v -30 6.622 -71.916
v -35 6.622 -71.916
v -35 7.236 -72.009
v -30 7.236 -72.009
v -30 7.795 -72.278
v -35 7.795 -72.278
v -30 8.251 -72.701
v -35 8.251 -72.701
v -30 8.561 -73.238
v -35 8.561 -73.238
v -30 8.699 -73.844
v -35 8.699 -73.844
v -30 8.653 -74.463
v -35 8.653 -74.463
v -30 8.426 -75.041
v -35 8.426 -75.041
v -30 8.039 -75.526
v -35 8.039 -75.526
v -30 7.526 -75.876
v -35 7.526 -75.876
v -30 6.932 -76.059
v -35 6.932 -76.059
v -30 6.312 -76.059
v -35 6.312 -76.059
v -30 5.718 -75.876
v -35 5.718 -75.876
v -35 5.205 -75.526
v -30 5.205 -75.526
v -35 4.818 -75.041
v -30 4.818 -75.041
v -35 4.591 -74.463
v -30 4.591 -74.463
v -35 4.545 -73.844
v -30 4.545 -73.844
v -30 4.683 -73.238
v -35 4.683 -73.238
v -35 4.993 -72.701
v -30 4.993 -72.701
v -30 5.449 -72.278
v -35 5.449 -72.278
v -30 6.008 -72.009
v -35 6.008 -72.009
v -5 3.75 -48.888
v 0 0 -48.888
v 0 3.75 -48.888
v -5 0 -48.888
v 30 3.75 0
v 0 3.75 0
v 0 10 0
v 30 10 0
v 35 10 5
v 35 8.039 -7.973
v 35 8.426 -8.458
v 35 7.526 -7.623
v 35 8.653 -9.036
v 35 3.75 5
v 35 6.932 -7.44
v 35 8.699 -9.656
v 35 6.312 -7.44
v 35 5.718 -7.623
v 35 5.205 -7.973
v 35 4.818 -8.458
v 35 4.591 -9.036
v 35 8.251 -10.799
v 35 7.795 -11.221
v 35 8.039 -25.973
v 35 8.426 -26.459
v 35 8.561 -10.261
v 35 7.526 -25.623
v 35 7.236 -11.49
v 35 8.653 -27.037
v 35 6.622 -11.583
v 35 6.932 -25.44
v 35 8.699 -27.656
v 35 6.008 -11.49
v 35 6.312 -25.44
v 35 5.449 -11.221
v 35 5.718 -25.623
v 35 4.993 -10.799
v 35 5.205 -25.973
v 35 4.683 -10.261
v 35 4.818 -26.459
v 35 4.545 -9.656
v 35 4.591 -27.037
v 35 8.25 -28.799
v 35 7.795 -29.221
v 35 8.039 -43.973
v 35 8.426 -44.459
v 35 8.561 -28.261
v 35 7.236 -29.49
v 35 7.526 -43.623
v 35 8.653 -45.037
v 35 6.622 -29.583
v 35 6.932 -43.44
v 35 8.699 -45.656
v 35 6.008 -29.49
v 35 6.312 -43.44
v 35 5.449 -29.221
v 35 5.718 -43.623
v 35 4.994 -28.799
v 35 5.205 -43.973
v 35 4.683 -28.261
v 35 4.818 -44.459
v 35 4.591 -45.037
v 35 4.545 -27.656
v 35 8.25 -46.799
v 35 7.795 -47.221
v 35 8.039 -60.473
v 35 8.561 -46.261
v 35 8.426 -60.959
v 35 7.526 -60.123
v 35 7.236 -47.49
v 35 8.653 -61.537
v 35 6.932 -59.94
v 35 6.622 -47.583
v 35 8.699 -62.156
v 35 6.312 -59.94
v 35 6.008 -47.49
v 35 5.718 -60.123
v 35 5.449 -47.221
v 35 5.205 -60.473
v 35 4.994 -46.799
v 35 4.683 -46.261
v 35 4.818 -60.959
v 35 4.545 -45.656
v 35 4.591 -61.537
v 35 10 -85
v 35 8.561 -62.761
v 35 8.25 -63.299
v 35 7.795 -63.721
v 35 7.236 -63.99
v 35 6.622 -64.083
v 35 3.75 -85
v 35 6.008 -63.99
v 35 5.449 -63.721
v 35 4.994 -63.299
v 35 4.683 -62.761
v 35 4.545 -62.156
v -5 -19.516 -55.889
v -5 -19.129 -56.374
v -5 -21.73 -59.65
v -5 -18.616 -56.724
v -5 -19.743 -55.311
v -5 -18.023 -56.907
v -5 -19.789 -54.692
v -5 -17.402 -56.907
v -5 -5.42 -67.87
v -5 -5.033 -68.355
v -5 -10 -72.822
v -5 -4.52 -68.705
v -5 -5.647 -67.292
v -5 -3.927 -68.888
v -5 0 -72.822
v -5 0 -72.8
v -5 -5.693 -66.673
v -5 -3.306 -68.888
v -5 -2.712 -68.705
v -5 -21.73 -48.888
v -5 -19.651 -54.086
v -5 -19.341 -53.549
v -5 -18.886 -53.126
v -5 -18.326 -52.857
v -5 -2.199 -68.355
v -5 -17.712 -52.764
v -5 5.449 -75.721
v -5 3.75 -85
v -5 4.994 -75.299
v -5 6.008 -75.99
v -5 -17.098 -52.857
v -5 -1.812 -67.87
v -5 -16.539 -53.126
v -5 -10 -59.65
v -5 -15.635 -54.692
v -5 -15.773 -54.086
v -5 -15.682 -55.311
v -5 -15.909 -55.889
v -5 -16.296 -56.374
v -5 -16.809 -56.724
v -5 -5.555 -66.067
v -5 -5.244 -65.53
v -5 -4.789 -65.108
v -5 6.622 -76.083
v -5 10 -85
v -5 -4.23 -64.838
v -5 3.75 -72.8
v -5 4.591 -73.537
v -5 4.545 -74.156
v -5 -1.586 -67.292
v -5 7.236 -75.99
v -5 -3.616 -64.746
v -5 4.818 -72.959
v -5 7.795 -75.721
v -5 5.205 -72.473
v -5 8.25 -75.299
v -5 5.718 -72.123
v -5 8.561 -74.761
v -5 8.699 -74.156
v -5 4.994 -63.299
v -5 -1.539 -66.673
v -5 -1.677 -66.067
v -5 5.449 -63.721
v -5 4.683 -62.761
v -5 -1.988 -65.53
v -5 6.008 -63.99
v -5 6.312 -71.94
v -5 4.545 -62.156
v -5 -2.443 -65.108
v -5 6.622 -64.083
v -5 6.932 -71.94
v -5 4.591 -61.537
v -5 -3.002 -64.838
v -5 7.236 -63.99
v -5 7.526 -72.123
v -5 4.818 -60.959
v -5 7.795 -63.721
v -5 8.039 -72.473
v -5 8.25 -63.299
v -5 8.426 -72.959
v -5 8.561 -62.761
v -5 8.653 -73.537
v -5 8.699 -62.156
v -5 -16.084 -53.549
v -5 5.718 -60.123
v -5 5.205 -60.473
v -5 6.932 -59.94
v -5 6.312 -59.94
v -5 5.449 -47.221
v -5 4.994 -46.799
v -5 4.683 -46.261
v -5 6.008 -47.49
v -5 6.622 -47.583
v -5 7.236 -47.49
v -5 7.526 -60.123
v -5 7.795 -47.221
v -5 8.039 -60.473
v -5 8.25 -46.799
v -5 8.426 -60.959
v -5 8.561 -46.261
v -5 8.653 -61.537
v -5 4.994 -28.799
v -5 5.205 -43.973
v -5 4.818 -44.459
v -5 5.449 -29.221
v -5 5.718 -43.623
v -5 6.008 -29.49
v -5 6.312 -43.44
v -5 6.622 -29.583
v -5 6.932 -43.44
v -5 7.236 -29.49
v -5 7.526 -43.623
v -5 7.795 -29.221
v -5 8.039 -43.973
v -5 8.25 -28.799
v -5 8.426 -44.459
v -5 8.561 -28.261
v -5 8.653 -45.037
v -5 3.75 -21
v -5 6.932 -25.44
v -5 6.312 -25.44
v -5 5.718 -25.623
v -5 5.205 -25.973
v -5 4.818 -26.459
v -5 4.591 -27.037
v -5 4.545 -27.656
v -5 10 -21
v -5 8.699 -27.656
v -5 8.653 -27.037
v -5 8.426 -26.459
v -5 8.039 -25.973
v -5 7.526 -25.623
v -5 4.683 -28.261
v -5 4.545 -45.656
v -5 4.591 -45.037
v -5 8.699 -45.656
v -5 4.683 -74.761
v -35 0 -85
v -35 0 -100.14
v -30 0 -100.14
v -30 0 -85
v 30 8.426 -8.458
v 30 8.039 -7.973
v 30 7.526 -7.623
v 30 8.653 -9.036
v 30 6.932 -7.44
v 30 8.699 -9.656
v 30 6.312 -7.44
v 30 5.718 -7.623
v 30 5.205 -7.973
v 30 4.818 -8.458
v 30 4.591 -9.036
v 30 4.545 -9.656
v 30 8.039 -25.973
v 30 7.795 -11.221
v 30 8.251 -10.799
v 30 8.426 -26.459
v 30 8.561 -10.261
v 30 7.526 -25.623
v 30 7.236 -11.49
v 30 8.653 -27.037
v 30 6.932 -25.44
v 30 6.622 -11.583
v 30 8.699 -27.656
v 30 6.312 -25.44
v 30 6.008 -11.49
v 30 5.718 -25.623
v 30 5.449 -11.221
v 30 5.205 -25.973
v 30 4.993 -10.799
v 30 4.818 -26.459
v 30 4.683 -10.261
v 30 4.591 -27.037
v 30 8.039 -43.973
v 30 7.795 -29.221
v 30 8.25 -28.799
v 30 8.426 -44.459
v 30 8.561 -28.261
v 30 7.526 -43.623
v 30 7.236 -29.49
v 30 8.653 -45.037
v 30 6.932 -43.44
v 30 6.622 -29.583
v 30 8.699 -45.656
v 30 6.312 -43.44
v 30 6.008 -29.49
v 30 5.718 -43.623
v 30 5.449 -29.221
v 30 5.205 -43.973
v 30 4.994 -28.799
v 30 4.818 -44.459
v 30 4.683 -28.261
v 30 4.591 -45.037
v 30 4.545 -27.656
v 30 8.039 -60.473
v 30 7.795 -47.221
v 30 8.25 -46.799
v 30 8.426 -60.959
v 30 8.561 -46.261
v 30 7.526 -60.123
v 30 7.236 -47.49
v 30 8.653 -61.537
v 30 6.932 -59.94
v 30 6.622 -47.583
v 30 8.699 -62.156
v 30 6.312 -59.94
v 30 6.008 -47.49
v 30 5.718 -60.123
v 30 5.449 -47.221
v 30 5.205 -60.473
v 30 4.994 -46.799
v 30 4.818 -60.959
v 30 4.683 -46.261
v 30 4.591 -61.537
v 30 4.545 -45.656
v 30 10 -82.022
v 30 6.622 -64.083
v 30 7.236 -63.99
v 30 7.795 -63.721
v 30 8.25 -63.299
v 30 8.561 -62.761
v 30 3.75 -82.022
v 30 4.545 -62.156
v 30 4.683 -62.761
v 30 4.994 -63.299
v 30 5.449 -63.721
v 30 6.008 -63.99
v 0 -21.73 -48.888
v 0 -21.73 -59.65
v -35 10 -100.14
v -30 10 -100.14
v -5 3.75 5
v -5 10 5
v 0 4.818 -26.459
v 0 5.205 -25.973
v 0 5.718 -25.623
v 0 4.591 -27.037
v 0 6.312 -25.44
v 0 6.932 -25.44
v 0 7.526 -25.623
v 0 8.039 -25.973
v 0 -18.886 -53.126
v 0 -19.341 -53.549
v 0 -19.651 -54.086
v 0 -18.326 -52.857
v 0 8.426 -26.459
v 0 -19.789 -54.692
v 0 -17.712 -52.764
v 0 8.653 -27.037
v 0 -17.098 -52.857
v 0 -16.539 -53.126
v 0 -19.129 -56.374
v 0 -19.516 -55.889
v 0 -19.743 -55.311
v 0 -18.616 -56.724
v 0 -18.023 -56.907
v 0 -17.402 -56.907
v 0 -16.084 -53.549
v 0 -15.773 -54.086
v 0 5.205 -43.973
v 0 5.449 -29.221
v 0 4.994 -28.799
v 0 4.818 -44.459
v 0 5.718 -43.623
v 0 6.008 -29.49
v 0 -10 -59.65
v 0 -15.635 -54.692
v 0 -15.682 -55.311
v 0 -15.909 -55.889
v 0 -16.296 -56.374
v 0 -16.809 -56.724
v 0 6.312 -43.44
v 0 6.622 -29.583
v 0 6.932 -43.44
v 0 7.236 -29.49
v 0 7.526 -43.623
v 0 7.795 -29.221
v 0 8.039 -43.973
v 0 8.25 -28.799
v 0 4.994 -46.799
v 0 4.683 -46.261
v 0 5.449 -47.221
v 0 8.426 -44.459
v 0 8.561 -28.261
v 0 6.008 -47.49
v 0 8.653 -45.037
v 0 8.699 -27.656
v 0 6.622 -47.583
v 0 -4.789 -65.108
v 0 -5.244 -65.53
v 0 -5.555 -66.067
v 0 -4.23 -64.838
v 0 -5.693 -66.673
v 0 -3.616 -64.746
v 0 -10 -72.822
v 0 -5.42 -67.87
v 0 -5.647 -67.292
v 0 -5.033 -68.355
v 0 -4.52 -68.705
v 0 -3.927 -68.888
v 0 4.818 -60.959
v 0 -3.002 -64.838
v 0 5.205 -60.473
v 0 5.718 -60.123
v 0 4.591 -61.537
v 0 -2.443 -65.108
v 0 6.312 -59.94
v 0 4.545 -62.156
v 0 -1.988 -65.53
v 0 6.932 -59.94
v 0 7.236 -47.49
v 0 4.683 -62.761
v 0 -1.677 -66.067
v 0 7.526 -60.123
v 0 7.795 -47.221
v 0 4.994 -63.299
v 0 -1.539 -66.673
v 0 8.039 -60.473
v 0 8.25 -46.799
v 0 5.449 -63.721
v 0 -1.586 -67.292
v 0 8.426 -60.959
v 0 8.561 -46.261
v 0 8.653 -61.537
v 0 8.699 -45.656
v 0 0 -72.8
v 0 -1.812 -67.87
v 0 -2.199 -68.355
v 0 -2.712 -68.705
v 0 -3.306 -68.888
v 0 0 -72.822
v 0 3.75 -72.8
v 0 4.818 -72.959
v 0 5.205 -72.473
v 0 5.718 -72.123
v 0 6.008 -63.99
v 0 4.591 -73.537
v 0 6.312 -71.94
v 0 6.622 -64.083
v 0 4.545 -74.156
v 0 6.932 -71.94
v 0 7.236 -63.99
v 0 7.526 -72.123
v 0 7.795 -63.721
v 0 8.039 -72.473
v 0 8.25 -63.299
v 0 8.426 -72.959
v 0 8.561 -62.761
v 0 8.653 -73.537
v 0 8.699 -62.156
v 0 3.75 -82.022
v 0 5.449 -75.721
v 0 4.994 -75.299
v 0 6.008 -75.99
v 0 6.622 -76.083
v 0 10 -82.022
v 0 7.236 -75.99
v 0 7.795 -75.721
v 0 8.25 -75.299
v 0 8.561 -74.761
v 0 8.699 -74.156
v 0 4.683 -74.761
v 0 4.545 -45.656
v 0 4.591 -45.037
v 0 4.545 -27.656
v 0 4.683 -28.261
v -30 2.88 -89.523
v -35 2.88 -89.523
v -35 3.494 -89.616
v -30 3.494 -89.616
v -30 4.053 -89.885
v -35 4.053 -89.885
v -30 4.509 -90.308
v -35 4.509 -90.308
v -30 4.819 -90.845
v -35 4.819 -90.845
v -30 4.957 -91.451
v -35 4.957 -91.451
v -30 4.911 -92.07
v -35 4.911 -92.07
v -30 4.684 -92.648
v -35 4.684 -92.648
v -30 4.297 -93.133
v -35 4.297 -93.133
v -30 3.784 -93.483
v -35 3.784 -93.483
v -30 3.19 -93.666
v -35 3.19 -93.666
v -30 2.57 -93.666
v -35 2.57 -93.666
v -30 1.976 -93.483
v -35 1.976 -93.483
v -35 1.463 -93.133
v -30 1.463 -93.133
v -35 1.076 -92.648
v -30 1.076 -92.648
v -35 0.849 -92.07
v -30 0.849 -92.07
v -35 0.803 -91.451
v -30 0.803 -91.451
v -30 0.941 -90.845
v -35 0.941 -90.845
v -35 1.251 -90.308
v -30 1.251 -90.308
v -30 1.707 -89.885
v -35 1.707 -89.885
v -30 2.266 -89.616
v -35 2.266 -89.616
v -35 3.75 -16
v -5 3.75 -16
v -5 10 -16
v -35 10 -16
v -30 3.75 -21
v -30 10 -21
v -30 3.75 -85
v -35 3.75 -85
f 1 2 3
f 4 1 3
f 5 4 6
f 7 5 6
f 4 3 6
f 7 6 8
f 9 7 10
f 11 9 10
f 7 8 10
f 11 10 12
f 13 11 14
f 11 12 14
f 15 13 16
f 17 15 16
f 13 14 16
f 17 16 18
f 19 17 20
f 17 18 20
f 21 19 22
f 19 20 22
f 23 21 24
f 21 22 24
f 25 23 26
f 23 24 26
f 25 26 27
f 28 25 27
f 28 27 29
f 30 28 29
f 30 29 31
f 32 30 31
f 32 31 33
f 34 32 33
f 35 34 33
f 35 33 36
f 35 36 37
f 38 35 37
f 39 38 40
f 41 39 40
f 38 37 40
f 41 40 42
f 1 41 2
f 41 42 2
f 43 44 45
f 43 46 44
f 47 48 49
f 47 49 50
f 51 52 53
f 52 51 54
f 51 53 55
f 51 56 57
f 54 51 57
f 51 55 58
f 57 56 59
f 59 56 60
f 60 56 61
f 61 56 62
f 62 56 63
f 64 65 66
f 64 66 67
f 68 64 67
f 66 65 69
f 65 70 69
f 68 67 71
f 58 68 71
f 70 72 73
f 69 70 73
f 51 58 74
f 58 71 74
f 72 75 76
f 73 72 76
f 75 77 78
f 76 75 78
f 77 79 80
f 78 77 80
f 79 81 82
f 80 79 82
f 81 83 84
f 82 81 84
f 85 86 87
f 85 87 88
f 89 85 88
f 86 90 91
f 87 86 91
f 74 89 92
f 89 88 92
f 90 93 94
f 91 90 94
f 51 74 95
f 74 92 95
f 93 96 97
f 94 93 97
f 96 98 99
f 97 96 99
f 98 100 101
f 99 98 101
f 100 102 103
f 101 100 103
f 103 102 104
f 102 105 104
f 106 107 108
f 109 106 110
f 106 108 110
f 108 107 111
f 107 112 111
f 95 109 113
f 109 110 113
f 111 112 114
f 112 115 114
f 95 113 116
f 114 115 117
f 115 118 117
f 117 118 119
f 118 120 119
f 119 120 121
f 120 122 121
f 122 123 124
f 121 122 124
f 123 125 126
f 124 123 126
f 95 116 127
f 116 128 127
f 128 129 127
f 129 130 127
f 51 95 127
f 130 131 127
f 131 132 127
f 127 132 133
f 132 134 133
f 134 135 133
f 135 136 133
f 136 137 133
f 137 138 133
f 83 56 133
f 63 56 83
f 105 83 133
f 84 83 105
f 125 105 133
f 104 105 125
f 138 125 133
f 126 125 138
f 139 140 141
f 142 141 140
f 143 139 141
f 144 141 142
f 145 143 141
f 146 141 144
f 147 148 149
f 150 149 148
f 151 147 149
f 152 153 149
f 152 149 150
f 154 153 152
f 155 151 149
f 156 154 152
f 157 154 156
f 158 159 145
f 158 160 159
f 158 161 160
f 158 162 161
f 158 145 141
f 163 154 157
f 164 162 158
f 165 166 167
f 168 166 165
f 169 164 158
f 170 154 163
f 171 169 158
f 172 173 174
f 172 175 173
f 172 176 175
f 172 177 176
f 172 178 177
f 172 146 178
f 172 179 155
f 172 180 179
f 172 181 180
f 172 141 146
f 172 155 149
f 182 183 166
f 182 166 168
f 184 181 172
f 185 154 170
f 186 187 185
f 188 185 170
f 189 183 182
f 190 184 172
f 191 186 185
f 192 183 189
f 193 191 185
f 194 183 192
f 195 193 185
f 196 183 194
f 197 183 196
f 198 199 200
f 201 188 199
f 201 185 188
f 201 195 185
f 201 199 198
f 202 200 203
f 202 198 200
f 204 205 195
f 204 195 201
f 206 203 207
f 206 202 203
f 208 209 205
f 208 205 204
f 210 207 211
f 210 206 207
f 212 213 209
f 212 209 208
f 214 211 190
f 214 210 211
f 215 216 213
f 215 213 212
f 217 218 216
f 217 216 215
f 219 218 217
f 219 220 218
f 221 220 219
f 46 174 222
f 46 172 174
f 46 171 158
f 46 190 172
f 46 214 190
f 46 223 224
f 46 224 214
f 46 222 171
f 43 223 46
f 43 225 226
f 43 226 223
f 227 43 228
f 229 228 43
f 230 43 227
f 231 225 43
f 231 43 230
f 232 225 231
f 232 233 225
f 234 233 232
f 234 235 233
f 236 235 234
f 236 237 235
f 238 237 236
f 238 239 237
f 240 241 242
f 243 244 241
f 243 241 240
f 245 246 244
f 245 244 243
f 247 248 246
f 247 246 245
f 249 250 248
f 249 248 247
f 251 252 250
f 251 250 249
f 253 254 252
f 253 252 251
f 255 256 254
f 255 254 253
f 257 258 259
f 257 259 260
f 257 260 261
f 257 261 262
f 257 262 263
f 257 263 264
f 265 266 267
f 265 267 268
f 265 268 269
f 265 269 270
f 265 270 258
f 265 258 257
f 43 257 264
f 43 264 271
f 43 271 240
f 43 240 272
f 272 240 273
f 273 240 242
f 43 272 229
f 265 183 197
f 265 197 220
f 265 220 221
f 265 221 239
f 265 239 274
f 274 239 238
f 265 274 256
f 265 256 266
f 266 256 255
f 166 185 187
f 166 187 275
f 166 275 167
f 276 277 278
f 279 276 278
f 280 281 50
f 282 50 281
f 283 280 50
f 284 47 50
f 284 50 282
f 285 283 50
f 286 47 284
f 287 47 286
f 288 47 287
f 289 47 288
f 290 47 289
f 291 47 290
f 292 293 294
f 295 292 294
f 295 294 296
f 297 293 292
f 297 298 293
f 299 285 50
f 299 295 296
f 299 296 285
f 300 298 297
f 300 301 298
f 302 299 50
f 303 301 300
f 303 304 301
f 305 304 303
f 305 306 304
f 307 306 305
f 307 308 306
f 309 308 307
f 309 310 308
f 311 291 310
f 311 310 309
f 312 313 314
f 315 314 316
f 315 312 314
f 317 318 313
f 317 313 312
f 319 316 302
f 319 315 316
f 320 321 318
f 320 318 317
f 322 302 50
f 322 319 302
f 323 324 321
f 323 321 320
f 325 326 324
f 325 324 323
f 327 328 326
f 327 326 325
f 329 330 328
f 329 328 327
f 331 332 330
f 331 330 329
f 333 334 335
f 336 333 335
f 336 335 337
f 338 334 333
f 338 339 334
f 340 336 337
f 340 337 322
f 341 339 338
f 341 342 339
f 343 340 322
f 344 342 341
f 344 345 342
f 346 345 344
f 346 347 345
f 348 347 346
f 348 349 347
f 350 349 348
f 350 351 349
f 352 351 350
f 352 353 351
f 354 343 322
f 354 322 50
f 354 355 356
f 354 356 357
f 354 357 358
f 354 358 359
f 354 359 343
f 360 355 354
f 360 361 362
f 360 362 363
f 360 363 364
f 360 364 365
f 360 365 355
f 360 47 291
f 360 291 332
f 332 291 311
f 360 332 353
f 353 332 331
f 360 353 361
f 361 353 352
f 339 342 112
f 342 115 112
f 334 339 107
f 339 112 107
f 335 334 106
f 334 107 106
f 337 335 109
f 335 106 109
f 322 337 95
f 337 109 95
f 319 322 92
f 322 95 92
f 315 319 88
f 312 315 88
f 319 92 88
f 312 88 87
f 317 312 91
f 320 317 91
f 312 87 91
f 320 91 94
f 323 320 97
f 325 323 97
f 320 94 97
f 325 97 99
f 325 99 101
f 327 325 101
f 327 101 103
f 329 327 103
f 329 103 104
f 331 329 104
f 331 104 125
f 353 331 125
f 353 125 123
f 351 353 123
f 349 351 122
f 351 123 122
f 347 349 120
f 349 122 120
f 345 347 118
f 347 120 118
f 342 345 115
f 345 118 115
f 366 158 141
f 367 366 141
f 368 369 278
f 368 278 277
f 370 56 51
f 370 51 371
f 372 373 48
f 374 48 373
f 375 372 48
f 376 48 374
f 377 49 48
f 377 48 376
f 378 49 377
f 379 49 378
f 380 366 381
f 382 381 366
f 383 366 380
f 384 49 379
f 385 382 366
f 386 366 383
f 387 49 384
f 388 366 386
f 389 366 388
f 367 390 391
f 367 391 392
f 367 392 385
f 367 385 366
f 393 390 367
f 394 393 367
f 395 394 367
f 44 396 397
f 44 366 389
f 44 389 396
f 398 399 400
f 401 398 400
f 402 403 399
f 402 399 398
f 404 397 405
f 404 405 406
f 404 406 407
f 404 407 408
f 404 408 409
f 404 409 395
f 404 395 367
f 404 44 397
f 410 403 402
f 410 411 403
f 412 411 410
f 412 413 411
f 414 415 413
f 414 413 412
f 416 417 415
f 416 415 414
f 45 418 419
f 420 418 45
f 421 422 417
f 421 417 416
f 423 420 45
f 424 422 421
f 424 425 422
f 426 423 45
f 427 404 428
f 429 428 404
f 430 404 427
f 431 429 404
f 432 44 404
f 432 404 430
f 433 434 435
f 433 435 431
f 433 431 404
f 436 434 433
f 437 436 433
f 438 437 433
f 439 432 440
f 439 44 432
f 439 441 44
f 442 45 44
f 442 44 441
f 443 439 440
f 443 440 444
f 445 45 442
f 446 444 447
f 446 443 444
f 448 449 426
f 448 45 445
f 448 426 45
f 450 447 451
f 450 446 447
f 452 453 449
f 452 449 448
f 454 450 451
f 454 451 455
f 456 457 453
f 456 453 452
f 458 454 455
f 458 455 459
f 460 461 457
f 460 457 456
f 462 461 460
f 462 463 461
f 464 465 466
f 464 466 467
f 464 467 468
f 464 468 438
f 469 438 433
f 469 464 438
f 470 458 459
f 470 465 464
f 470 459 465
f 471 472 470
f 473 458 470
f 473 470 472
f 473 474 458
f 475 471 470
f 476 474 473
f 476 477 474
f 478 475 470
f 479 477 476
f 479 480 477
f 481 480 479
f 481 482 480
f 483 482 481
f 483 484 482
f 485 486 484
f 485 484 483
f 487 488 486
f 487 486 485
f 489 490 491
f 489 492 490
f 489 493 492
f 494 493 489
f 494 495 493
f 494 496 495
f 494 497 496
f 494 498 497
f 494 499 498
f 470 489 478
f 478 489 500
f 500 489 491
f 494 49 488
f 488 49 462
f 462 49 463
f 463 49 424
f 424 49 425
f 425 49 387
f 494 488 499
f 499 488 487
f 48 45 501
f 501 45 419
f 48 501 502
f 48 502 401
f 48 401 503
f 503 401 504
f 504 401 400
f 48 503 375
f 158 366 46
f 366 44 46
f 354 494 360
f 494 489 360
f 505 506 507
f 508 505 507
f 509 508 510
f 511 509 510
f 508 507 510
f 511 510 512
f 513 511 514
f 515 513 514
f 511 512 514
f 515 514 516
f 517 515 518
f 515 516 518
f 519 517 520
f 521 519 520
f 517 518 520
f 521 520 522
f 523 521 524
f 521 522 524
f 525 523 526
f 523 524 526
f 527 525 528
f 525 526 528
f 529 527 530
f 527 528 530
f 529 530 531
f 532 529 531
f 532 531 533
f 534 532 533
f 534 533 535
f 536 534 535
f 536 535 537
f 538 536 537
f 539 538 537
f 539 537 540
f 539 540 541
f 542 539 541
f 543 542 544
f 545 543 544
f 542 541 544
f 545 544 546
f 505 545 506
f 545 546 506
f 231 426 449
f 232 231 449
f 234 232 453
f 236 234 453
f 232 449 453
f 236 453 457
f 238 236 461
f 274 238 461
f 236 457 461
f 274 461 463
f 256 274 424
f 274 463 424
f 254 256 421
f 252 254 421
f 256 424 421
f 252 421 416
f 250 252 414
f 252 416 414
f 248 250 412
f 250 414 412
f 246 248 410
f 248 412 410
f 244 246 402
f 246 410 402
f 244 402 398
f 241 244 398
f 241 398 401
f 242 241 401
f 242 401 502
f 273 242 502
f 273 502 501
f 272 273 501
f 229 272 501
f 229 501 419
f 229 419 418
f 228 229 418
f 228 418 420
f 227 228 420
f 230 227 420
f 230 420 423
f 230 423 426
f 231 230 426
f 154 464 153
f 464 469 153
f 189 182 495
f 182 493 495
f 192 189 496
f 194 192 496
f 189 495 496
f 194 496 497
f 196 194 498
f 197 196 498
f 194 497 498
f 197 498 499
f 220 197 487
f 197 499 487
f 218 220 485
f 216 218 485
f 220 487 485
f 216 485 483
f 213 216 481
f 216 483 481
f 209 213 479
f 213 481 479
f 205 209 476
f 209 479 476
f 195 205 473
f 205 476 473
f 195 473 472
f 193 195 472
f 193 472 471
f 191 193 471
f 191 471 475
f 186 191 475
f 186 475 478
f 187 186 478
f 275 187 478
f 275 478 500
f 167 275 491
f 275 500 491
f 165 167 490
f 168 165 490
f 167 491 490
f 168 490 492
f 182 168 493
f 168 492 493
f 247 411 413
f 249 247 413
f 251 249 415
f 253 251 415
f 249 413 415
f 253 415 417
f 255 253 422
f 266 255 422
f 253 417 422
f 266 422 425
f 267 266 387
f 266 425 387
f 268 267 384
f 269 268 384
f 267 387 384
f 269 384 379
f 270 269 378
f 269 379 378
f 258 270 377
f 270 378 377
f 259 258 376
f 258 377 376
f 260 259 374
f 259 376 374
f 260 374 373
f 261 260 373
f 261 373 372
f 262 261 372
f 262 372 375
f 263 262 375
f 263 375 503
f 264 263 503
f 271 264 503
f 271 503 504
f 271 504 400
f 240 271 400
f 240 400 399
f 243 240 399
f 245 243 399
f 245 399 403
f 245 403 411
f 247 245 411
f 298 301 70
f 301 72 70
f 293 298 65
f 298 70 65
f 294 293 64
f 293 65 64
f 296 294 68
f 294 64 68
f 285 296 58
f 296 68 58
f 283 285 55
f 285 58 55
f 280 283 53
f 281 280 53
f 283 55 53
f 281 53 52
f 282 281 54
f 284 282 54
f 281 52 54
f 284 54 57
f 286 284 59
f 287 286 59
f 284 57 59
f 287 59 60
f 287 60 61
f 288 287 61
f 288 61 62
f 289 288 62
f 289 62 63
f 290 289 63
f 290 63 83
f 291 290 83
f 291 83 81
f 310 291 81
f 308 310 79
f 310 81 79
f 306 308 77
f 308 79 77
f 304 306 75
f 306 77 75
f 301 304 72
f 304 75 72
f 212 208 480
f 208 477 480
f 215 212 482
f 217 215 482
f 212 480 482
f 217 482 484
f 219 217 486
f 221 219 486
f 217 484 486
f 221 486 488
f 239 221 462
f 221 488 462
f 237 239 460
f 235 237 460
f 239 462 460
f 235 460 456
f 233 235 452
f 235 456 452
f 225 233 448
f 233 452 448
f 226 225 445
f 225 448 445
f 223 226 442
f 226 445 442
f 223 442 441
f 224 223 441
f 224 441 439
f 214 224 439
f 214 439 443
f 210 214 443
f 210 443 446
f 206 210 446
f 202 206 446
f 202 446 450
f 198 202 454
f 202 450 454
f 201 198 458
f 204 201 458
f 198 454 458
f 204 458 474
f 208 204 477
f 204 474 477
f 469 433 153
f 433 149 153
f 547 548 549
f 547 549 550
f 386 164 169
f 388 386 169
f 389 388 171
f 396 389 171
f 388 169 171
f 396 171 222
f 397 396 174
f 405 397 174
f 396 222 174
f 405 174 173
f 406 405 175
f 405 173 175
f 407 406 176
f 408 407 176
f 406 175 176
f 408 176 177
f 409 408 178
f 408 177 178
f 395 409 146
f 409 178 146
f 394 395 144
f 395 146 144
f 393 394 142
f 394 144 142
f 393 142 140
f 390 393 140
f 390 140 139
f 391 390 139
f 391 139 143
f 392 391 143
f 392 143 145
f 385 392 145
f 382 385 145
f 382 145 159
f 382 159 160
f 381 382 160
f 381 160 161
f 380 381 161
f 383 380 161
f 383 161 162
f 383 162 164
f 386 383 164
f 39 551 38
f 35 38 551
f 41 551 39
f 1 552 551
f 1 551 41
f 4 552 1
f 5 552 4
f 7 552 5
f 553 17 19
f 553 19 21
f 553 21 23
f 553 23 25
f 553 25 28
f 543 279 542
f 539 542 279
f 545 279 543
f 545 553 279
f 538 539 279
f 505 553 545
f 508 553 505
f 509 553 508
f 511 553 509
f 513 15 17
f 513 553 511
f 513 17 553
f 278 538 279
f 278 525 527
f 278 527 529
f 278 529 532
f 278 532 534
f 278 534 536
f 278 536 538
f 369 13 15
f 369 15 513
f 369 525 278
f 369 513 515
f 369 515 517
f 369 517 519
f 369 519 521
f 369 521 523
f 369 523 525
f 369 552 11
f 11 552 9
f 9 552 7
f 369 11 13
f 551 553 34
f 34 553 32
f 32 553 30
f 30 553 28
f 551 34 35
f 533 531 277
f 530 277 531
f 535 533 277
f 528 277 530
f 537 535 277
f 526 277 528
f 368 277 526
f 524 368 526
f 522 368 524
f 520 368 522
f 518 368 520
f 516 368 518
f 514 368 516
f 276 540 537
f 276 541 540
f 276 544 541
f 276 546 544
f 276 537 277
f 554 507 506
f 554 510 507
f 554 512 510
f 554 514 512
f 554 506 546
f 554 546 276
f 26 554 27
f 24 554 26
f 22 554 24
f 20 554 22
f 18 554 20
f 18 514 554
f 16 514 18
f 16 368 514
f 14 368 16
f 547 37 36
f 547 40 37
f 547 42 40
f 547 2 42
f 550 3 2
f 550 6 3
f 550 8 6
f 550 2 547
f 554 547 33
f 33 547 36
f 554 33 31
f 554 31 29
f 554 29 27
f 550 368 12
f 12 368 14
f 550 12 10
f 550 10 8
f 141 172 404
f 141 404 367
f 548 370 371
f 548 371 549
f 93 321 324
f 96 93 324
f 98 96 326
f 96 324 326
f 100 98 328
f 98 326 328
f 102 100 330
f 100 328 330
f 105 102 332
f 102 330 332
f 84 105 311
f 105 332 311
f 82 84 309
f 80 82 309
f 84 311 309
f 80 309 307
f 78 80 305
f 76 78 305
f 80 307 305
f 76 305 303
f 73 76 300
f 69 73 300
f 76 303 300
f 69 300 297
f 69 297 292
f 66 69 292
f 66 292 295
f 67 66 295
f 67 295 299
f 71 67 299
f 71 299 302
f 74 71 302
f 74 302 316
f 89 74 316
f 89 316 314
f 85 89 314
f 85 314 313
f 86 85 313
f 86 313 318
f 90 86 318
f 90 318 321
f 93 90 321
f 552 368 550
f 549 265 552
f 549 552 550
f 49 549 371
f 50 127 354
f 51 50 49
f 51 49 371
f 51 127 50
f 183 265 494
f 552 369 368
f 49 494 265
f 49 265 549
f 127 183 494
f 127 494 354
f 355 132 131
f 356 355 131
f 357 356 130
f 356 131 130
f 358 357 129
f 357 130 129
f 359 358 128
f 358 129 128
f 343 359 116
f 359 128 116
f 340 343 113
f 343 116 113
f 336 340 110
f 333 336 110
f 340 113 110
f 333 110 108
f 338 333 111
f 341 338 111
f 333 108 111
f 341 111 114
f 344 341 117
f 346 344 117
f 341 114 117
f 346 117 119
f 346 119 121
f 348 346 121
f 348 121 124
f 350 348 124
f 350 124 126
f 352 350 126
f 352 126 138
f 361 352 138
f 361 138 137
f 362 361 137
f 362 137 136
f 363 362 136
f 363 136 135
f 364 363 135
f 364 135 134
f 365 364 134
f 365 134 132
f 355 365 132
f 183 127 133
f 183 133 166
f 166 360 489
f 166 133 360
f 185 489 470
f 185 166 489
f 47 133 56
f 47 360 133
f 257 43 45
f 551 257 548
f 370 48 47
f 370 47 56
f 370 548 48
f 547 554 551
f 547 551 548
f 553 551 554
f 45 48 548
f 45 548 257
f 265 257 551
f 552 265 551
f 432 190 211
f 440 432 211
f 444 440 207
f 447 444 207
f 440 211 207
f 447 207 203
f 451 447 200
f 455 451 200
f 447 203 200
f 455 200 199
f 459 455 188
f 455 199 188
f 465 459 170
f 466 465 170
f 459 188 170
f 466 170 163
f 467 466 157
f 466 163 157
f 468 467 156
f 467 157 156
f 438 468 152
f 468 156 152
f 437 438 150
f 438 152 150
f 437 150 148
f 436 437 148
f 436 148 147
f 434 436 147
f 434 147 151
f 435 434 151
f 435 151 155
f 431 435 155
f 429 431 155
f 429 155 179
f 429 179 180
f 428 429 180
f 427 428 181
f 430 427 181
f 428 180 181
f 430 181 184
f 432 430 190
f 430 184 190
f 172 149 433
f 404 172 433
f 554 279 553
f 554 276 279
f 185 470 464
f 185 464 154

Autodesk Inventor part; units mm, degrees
ref_plane "YZ Plane" through (0, 0, 0) normal (1, 0, 0) x (0, 1, 0)
ref_plane "XZ Plane" through (0, 0, 0) normal (0, 1, 0) x (-1, 0, 0)
ref_plane "XY Plane" through (0, 0, 0) normal (0, 0, 1) x (1, 0, 0)
sketch "Sketch1" plane through (0, 0, 0) normal (0, 1, 0) x (-1, 0, 0)
  line L0 (0, 0) -> (-30, 0)
  line L1 (-30, 0) -> (-30, -80)
  line L2 (0, 0) -> (0, -21)
  line L3 (0, -21) -> (30, -21)
  line L4 (30, -21) -> (30, -80)
  line L5 (30, -80) -> (30, -112)
  line L6 (30, -112) -> (8.74, -112)
  line L7 (8.74, -112) -> (8.74, -80)
  line L8 (8.74, -80) -> (-30, -80)
  line L9 (-35, 5) -> (-35, -85)
  line L10 (-35, -85) -> (3.74, -85)
  line L11 (3.74, -85) -> (3.74, -117)
  line L12 (-35, 5) -> (5, 5)
  line L13 (5, 5) -> (5, -16)
  line L14 (5, -16) -> (35, -16)
  line L15 (35, -16) -> (35, -117)
  line L16 (35, -117) -> (3.74, -117)
  line L17 (0, -21) -> (5, -21)
  line L18 (0, -21) -> (5, -21)
  line L19 (5, -21) -> (5, -80)
  line L20 (0, -21) -> (0, -80)
  dimension "d0" = 30
  dimension "d2" = 21
  dimension "d3" = 30
  dimension "d4" = 59
  dimension "d5" = 32
  dimension "d6" = 21.26
  dimension "d9" = 90
  dimension "d10" = 38.74
  dimension "d11" = 32
  dimension "d12" = 40
  dimension "d13" = 21
  dimension "d14" = 30
extrude "Extrusion1" add sketch "Sketch1" along normal blind 16 contours L3 L19 L8 L20 | L12 L13 L14 L15 L16 L11 L10 L9
sketch "Sketch2" plane through (0, 16, 0) normal (0, 1, 0) x (1, 0, 0)
  line L0 (35, -5) -> (35, 85) projected
  line L1 (35, 85) -> (-46.5269, 85)
  line L2 (-46.5269, 85) -> (-46.5269, 122.3541)
  line L3 (-46.5269, 122.3541) -> (35, 122.3541)
  line L4 (35, 122.3541) -> (35, 85)
  point P0 (0, 0)
extrude "Extrusion2" cut sketch "Sketch2" against normal blind 16
sketch "Sketch3" plane through (0, 16, 0) normal (0, 1, 0) x (1, 0, 0)
  line L0 (-5, 21) -> (-5, 80) projected
  line L1 (-5, 78.0031) -> (-14.0245, 78.0031)
  line L2 (-14.0245, 78.0031) -> (-14.0245, 94.0311)
  line L3 (-14.0245, 94.0311) -> (-5, 94.0311)
  line L4 (-5, 94.0311) -> (-5, 78.0031)
  point P0 (0, 0)
extrude "Extrusion3" cut sketch "Sketch3" against normal blind 16
sketch "Sketch5" plane through (35, 0, 5) normal (1, 0, 0) x (0, 0, -1)
  line L0 (0, 0) -> (90, 0) projected
  line L1 (0, 0) -> (9.5, 0)
  line L2 (9.5, 0) -> (9.5, 6.622)
  line L3 (9.5, 0) -> (14.5, 0)
  line L4 (14.5, 0) -> (14.5, 6.622)
  circle A0 centre (14.5, 6.622) radius 2.083
  point P0 (5, 0)
  dimension "d21" = 9.5
  dimension "d23" = 5
  dimension "d24" = 6.622
  dimension "d25" = 4.166
extrude "Extrusion4" cut sketch "Sketch5" against normal blind 16
sketch "Sketch6" plane through (0, 0, -80) normal (1, 0, 0) x (0, 0, -1)
  circle A0 centre (-70.5, 6.622) radius 2.083 projected
  line L0 (-70.5, 6.622) -> (-52.5, 6.622)
  circle A1 centre (-52.5, 6.622) radius 2.0828
  point P0 (-80, 0)
  dimension "d29" = 18
  dimension "d30" = 4.1656
extrude "Extrusion5" cut sketch "Sketch6" along normal blind 50 and the other way blind 25 contours A1
sketch "Sketch7" plane through (35, 0, 5) normal (1, 0, 0) x (0, 0, -1)
  circle A0 centre (32.5, 6.622) radius 2.0828 projected
  line L0 (32.5, 6.622) -> (50.5, 6.622)
  line L1 (50.5, 6.622) -> (67, 6.622)
  circle A1 centre (50.5, 6.622) radius 2.0828
  circle A2 centre (67, 6.622) radius 2.0828
  point P0 (5, 0)
  dimension "d37" = 18
  dimension "d38" = 16.5
  dimension "d39" = 4.1656
  dimension "d40" = 4.1656
extrude "Extrusion6" cut sketch "Sketch7" against normal blind 50 contours A1 L1 L0 | L0 L1 A1 | A2
sketch "Sketch9" plane through (0, 0, -80) normal (1, 0, 0) x (0, 0, -1)
  circle A0 centre (-18, 6.622) radius 2.0828 projected
  line L0 (-18, 6.622) -> (-6, 6.622)
  circle A1 centre (-6, 6.622) radius 2.0828
  point P0 (-80, 0)
  dimension "d43" = 12
  dimension "d44" = 4.1656
extrude "Extrusion7" cut sketch "Sketch9" against normal blind 10 contours A1
sketch "Sketch10" plane through (0, 0, 0) normal (0, -1, 0) x (1, 0, 0)
  line L0 (0, -80.0219) -> (8.5, -80.0219)
  line L1 (8.5, -80.0219) -> (8.5, -82.0219)
  line L2 (8.5, -82.0219) -> (0, -82.0219)
  line L3 (0, -82.0219) -> (0, -80.0219)
  line L4 (8.5, -80.0219) -> (11.5, -80.0219)
  line L5 (11.5, -80.0219) -> (11.5, -82.0219)
  line L6 (11.5, -82.0219) -> (8.5, -82.0219)
  line L7 (8.5, -82.0219) -> (8.5, -80.0219)
  line L8 (8.5, -80.0219) -> (11.5, -80.0219)
  line L9 (11.5, -80.0219) -> (11.5, -75.0982)
  line L10 (11.5, -75.0982) -> (8.5, -75.0982)
  line L11 (8.5, -75.0982) -> (8.5, -80.0219)
  line L12 (30, 0) -> (30, -80) projected
  line L13 (30, -80) -> (21.5, -80)
  line L14 (21.5, -80) -> (21.5, -82.0219)
  line L15 (21.5, -82.0219) -> (30, -82.0219)
  line L16 (30, -82.0219) -> (30, -80)
  line L17 (21.5, -82.0219) -> (17, -82.0219)
  line L18 (17, -82.0219) -> (17, -71.2839)
  line L19 (17, -71.2839) -> (21.5, -71.2839)
  line L20 (21.5, -71.2839) -> (21.5, -82.0219)
  point P0 (0, 0)
  dimension "d47" = 8.5
  dimension "d48" = 2
  dimension "d49" = 3
  dimension "d50" = 8.5
  dimension "d51" = 4.5
extrude "Extrusion8" cut sketch "Sketch10" against normal blind 100 contours L14 L17 L18 L19 L20
sketch "Sketch11" plane through (0, 16, 0) normal (0, 1, 0) x (1, 0, 0)
  line L0 (-38.388, 86.2009) -> (-26.8829, 86.2009)
  line L1 (-26.8829, 86.2009) -> (-26.8829, 63.045)
  line L2 (-26.8829, 63.045) -> (-38.388, 63.045)
  line L3 (-38.388, 63.045) -> (-38.388, 86.2009)
  point P0 (0, 0)
extrude "Extrusion9" cut sketch "Sketch11" against normal blind 100
sketch "Sketch12" plane through (0, 0, 0) normal (0, -1, 0) x (1, 0, 0)
  line L0 (17, -80) -> (0, -80) projected
  line L1 (17, -82.0219) -> (17, -80)
  line L2 (17, -80) -> (0, -80)
  line L3 (0, -80) -> (0, -82.0219)
  line L4 (21.5, -82.0219) -> (17, -82.0219) projected
  line L5 (0, -82.0219) -> (17, -82.0219)
  point P0 (0, 0)
extrude "Extrusion10" cut sketch "Sketch12" against normal blind 16000
sketch "Sketch13" plane through (0, 0, 0) normal (0, -1, 0) x (1, 0, 0)
  line L0 (30, -80) -> (21.5, -80) projected
  line L1 (30, -80) -> (21.5, -80)
  line L2 (21.5, -80) -> (21.5, -82.0219) projected
  line L3 (21.5, -80) -> (21.5, -82.0219)
  line L4 (21.5, -82.0219) -> (30, -82.0219)
  line L5 (30, -82.0219) -> (30, -80)
  point P0 (0, 0)
extrude "Extrusion11" cut sketch "Sketch13" against normal blind 16000
sketch "Sketch14" plane through (0, 0, 0) normal (0, -1, 0) x (1, 0, 0)
  line L0 (-37.2661, -60.1404) -> (-28.1164, -60.1404)
  line L1 (-28.1164, -60.1404) -> (-28.1164, -64.2388)
  line L2 (-28.1164, -64.2388) -> (-37.2661, -64.2388)
  line L3 (-37.2661, -64.2388) -> (-37.2661, -60.1404)
  point P0 (0, 0)
extrude "Extrusion12" cut sketch "Sketch14" against normal blind 10000
sketch "Sketch15" plane through (0, 0, 0) normal (0, -1, 0) x (1, 0, 0)
  line L0 (-5, -85) -> (-5, -21) projected
  line L1 (0, 0) -> (0, -82.0219) projected
  line L2 (-5, -47.0884) -> (0, -47.0884)
  line L3 (0, -47.0884) -> (0, -60.3662)
  line L4 (0, -60.3662) -> (-5, -60.3662)
  line L5 (-5, -60.3662) -> (-5, -47.0884)
extrude "Extrusion13" add sketch "Sketch15" along normal blind 10
sketch "Sketch16" plane through (0, -10, 0) normal (0, -1, 0) x (1, 0, 0)
  line L0 (0, -47.0884) -> (-5, -47.0884) projected
  line L1 (0, 0) -> (0, -82.0219) projected
  line L2 (-5, -47.0884) -> (0, -47.0884)
  line L3 (0, -47.0884) -> (0, -53.8884)
  line L4 (0, -53.8884) -> (-5, -53.8884)
  line L5 (-5, -53.8884) -> (-5, -47.0884)
  line L6 (0, -82.0219) -> (0, -60.3662) projected
  line L7 (-5, -53.8884) -> (0, -53.8884)
  line L8 (0, -53.8884) -> (0, -68.0271)
  line L9 (0, -68.0271) -> (-5, -68.0271)
  line L10 (-5, -68.0271) -> (-5, -53.8884)
  dimension "d64" = 6.8
extrude "Extrusion14" add sketch "Sketch16" along normal mid plane 20 contours L1 L9 L10 L4
sketch "Sketch17" plane through (0, -10, 0) normal (0, -1, 0) x (1, 0, 0)
  line L0 (0, -47.0884) -> (-5, -47.0884) projected
  line L1 (0, -53.8884) -> (0, -47.0884) projected
  line L2 (-5, -47.0884) -> (0, -47.0884)
  line L3 (0, -47.0884) -> (0, -53.8884)
  line L4 (0, -53.8884) -> (-5, -53.8884)
  line L5 (-5, -53.8884) -> (-5, -47.0884)
  point P0 (0, 0)
extrude "Extrusion15" cut sketch "Sketch17" against normal blind 10
sketch "Sketch18" plane through (0, -20, 0) normal (0, -1, 0) x (1, 0, 0)
  line L0 (-5, -53.8884) -> (-5, -68.0271) projected
  line L1 (0, -71.9172) -> (0, -76.0828) projected
  line L2 (-5, -68.0271) -> (0, -68.0271)
  line L3 (0, -68.0271) -> (0, -76.0828)
  line L4 (0, -76.0828) -> (-5, -76.0828)
  line L5 (-5, -76.0828) -> (-5, -68.0271)
  point P0 (0, 0)
extrude "Extrusion16" add sketch "Sketch18" against normal blind 20
sketch "Sketch19" plane through (0, -20, 0) normal (0, -1, 0) x (1, 0, 0)
  line L0 (-5, -76.0828) -> (-5, -85) projected
  line L1 (0, -53.8884) -> (0, -76.0828) projected
  line L2 (-5, -76.0828) -> (0, -76.0828)
  line L3 (0, -76.0828) -> (0, -70.4113)
  line L4 (0, -70.4113) -> (-5, -70.4113)
  line L5 (-5, -70.4113) -> (-5, -76.0828)
  point P0 (0, 0)
extrude "Extrusion17" cut sketch "Sketch19" against normal blind 10
sketch "Sketch20" plane through (-5, 0, -21) normal (-1, 0, 0) x (0, 0, 1)
  line L0 (-55.0828, -10) -> (-49.4113, -10) projected
  line L1 (21, 0) -> (-61.0219, 0) projected
  line L2 (-55.0828, -10) -> (-51.8224, -10)
  line L3 (-51.8224, -10) -> (-51.8224, 0)
  line L4 (-51.8224, 0) -> (-55.0828, 0)
  line L5 (-55.0828, 0) -> (-55.0828, -10)
extrude "Extrusion18" cut sketch "Sketch20" against normal blind 10
sketch "Sketch21" plane through (-5, 0, -21) normal (-1, 0, 0) x (0, 0, 1)
  circle A0 centre (-53, 6.622) radius 2.0828 projected
  line L0 (-53, 6.622) -> (-45.8284, -3.6161)
  circle A1 centre (-45.8284, -3.6161) radius 2.0828
  point P0 (21, 0)
  dimension "d75" = 12.5
  dimension "d76" = 4.1656
extrude "Extrusion19" cut sketch "Sketch21" against normal blind 20 contours A1
sketch "Sketch22" plane through (-5, 0, -21) normal (-1, 0, 0) x (0, 0, 1)
  circle A0 centre (-45.8284, -3.6161) radius 2.0828 projected
  line L0 (-45.8284, -3.6161) -> (-33.8473, -17.7123)
  circle A1 centre (-33.8473, -17.7123) radius 2.0828
  point P0 (21, 0)
  dimension "d79" = 18.5
  dimension "d86" = 4.1656
sketch "Sketch23" plane through (0, 0, 0) normal (0, -1, 0) x (1, 0, 0)
  line L0 (-5, -53.8884) -> (0, -53.8884)
  line L1 (0, -53.8884) -> (0, -48.8884)
  line L2 (0, -48.8884) -> (-5, -48.8884)
  line L3 (-5, -48.8884) -> (-5, -53.8884)
  point P0 (0, 0)
  dimension "d80" = 5
  dimension "d81" = 5
extrude "Extrusion20" add sketch "Sketch23" along normal blind 24
sketch "Sketch24" plane through (0, -20, 0) normal (0, -1, 0) x (1, 0, 0)
  line L0 (0, -53.8884) -> (-5, -53.8884) projected
  line L1 (-5, -70.4113) -> (0, -70.4113) projected
  line L2 (-5, -53.8884) -> (0, -53.8884)
  line L3 (0, -53.8884) -> (0, -70.4113)
  line L4 (0, -70.4113) -> (-5, -70.4113)
  line L5 (-5, -70.4113) -> (-5, -53.8884)
  point P0 (0, 0)
extrude "Extrusion21" add sketch "Sketch24" along normal blind 4
extrude "Extrusion22" cut sketch "Sketch22" against normal blind 10 contours A1
sketch "Sketch25" plane through (-5, 0, -21) normal (-1, 0, 0) x (0, 0, 1)
  line L0 (-49.4113, -10) -> (-49.4113, -24) projected
  line L1 (-27.8884, 0) -> (-27.8884, -24) projected
  line L2 (-49.4113, -24) -> (-27.8884, -24)
  line L3 (-27.8884, -24) -> (-27.8884, -21.7301)
  line L4 (-27.8884, -21.7301) -> (-49.4113, -21.7301)
  line L5 (-49.4113, -21.7301) -> (-49.4113, -24)
  point P0 (21, 0)
extrude "Extrusion23" cut sketch "Sketch25" against normal blind 10
sketch "Sketch26" plane through (0, 16, 0) normal (0, 1, 0) x (1, 0, 0)
  line L0 (-35, 60.1404) -> (-30, 60.1404) projected
  line L1 (-35, 60.1404) -> (-30, 60.1404)
  line L2 (-30, 60.1404) -> (-30, 100.1404)
  line L3 (-30, 100.1404) -> (-35, 100.1404)
  line L4 (-35, 100.1404) -> (-35, 60.1404)
  point P0 (0, 0)
  dimension "d91" = 40
extrude "Extrusion24" add sketch "Sketch26" against normal blind 16
sketch "Sketch29" plane through (35, 0, 5) normal (1, 0, 0) x (0, 0, -1)
  line L0 (0, 16) -> (90, 16) projected
  line L1 (105.1404, 16) -> (105.1404, 0) projected
  line L2 (0, 16) -> (105.1404, 16)
  line L3 (105.1404, 16) -> (105.1404, 10)
  line L4 (105.1404, 10) -> (0, 10)
  line L5 (0, 10) -> (0, 16)
  line L6 (0, 0) -> (90, 0) projected
  point P0 (5, 0)
  dimension "d101" = 10
extrude "Extrusion27" cut sketch "Sketch29" against normal blind 70
sketch "Sketch30" plane through (-35, 0, -100.1404) normal (-1, 0, 0) x (0, 0, 1)
  line L0 (105.1404, 0) -> (15.1404, 0) projected
  line L1 (105.1404, 0) -> (51.2521, 0)
  line L2 (51.2521, 0) -> (51.2521, 3.75)
  line L3 (51.2521, 3.75) -> (105.1404, 3.75)
  line L4 (105.1404, 3.75) -> (105.1404, 0)
  line L5 (51.2521, 0) -> (51.2521, -21.7301) projected
  point P0 (100.1404, 0)
  dimension "d104" = 3.75
  dimension "d115" = 0
extrude "Extrusion28" cut sketch "Sketch30" against normal blind 70
sketch "Sketch31" plane through (35, 0, -85) normal (1, 0, 0) x (0, 0, -1)
  line L0 (-36.1116, 3.75) -> (-64, 3.75) projected
  line L1 (-36.1116, 0) -> (0, 0) projected
  line L2 (-36.1116, 3.75) -> (0, 3.75)
  line L3 (0, 3.75) -> (0, 0)
  line L4 (0, 0) -> (-36.1116, 0)
  line L5 (-36.1116, 0) -> (-36.1116, 3.75)
  point P0 (-85, 0)
extrude "Extrusion29" cut sketch "Sketch31" against normal blind 30
sketch "Sketch32" plane through (35, 10, -85) normal (0, 0, -1) x (-1, 0, 0)
  line L0 (40, -6.25) -> (35, -6.25) projected
  line L1 (29.9543, -10) -> (40, -10)
  line L2 (40, -10) -> (40, -6.25)
  line L3 (40, -6.25) -> (29.9543, -6.25)
  line L4 (29.9543, -6.25) -> (29.9543, -10)
  point P0 (35, -10)
extrude "Extrusion30" cut sketch "Sketch32" against normal blind 12.2
sketch "Sketch33" plane through (-5, -10, -72.8224) normal (-1, 0, 0) x (0, 0, 1)
  line L0 (2.4111, 0) -> (2.4111, -11.7301) projected
  line L1 (23.934, -11.7301) -> (2.4111, -11.7301) projected
  line L2 (2.4111, 0) -> (13.1725, 0)
  line L3 (13.1725, 0) -> (13.1725, -11.7301)
  line L4 (13.1725, -11.7301) -> (2.4111, -11.7301)
  line L5 (2.4111, -11.7301) -> (2.4111, 0)
  point P0 (72.8224, 10)
extrude "Extrusion31" cut sketch "Sketch33" against normal blind 12.2
sketch "Sketch35" plane through (-35, 0, -100.1404) normal (-1, 0, 0) x (0, 0, 1)
  line L0 (18.1185, 3.75) -> (100.1404, 3.75) projected
  line L1 (52.6043, 3.75) -> (49.8728, 3.75)
  line L2 (49.8728, 3.75) -> (49.8728, 0)
  line L3 (49.8728, 0) -> (52.6043, 0)
  line L4 (52.6043, 0) -> (52.6043, 3.75)
  point P0 (100.1404, 0)
extrude "Extrusion33" cut sketch "Sketch35" against normal blind 5
sketch "Sketch36" plane through (-35, 0, -100.1404) normal (-1, 0, 0) x (0, 0, 1)
  circle A0 centre (26.141, 6.622) radius 2.083
  line L0 (0, 10) -> (0, 0) projected
  line L1 (49.8728, 3.75) -> (84.1404, 3.75) projected
  point P0 (100.1404, 0)
  point P1 (15.1404, 3.75)
  dimension "d118" = 4.166
  dimension "d119" = 26.141
  dimension "d120" = 2.872
extrude "Extrusion34" cut sketch "Sketch36" against normal blind 10
sketch "Sketch37" plane through (-35, 0, -100.1404) normal (-1, 0, 0) x (0, 0, 1)
  line L0 (49.8728, 0) -> (49.8728, 3.75) projected
  line L1 (15.1404, 3.75) -> (15.1404, 10) projected
  line L2 (49.8728, 0) -> (15.1404, 0)
  line L3 (15.1404, 0) -> (15.1404, 3.75)
  line L4 (15.1404, 3.75) -> (49.8728, 3.75)
  line L5 (49.8728, 3.75) -> (49.8728, 0)
  point P0 (100.1404, 0)
extrude "Extrusion35" cut sketch "Sketch37" against normal blind 5
sketch "Sketch39" plane through (-35, 0, -100.1404) normal (-1, 0, 0) x (0, 0, 1)
  circle A0 centre (8.534, 2.88) radius 2.083
  line L0 (0, 10) -> (0, 0) projected
  line L1 (0, 0) -> (15.1404, 0) projected
  point P0 (100.1404, 0)
  dimension "d131" = 4.166
  dimension "d132" = 6.451
  dimension "d133" = 2.88
extrude "Extrusion37" cut sketch "Sketch39" against normal blind 5
properties part number "Mounting bracket"
